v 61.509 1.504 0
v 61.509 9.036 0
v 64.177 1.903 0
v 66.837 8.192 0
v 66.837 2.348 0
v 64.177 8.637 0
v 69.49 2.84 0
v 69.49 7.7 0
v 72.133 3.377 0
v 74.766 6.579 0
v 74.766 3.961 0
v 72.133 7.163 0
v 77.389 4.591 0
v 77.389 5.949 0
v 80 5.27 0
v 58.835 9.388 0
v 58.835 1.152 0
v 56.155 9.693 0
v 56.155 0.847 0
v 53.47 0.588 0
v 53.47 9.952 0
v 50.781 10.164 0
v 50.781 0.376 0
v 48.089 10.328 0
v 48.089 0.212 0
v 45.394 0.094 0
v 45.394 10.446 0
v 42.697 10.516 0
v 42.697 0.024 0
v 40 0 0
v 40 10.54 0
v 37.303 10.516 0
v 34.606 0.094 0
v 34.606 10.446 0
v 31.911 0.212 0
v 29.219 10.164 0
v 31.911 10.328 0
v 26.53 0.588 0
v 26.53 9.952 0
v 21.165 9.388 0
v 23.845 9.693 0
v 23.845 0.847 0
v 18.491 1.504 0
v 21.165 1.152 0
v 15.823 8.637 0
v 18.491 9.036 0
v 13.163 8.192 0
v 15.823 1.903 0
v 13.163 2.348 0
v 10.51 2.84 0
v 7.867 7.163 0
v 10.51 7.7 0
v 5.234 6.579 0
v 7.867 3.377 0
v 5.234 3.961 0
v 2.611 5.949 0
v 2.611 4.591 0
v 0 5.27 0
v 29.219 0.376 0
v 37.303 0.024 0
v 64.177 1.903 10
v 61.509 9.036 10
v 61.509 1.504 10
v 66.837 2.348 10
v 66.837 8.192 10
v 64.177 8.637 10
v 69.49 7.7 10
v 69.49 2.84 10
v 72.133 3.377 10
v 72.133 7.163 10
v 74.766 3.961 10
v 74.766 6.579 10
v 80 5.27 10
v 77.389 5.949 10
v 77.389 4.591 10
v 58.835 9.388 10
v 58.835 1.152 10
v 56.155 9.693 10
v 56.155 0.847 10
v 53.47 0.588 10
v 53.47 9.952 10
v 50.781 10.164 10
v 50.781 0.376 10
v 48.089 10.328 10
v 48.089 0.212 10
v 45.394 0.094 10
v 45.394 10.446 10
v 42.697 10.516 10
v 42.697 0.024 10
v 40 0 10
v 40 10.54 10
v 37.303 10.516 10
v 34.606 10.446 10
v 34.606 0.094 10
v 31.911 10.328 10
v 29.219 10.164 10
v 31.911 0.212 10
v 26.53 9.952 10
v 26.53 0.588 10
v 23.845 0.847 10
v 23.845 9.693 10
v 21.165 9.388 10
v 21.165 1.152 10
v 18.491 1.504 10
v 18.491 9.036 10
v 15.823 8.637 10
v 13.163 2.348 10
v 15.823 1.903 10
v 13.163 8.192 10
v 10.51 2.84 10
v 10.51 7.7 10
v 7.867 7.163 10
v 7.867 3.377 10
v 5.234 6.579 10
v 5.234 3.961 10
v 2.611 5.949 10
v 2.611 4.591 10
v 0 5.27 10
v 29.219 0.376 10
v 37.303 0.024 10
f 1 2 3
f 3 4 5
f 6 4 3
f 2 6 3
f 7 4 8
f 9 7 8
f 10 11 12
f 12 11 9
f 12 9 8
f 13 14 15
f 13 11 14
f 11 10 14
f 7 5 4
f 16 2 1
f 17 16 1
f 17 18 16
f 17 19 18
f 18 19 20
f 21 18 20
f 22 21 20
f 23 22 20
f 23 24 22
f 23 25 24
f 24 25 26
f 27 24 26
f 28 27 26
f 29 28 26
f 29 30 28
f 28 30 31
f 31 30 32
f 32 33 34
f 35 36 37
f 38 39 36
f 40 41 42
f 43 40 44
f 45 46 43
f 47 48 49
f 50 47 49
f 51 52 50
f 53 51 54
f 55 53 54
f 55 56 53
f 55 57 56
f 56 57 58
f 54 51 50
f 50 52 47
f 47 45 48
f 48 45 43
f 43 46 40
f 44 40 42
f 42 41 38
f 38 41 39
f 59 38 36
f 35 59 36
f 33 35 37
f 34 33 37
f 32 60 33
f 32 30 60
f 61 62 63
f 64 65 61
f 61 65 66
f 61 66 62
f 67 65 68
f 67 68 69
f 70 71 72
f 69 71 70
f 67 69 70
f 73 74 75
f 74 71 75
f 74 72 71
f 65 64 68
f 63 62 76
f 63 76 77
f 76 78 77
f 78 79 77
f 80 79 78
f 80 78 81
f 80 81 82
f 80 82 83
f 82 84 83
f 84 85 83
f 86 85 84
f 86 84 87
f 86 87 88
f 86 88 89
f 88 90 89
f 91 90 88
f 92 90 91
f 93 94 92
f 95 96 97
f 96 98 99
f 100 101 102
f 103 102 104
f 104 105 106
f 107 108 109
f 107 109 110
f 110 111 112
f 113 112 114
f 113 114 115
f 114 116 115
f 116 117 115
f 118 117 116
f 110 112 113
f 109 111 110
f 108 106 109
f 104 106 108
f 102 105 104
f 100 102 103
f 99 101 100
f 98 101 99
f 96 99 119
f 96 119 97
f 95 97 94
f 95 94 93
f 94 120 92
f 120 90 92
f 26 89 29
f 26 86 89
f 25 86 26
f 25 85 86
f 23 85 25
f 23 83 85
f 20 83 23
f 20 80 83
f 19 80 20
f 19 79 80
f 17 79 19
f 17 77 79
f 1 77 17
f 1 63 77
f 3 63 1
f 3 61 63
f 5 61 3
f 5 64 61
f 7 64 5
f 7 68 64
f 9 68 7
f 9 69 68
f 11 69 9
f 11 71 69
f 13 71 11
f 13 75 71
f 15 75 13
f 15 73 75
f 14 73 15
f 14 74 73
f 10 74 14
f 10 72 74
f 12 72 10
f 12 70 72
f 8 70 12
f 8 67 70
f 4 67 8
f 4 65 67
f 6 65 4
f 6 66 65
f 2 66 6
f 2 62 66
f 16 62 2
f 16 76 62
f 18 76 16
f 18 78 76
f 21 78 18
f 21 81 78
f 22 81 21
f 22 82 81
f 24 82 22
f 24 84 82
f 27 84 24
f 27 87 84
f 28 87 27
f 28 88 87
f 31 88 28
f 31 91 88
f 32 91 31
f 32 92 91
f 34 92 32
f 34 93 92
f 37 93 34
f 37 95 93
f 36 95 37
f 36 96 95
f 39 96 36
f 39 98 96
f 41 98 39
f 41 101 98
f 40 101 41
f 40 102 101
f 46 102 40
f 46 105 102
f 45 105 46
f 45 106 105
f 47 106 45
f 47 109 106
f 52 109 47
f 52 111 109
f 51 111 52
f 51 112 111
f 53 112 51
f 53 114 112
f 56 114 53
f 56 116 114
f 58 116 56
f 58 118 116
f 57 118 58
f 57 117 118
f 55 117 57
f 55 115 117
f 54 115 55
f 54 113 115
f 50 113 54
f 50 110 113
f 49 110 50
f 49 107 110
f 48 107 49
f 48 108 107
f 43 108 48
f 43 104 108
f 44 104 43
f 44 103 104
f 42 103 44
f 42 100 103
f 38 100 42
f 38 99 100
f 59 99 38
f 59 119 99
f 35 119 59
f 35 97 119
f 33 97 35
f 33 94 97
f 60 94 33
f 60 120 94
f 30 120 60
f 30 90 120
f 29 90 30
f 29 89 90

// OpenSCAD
$fn = 32;

// ----------------------------------------------------------------------
// Arc profile plate: lens, 60 points
// ----------------------------------------------------------------------

// --- parameters (mm) ---
lens_chord = 80;          // chord length of the lens, X
arc_r = 154.55;           // radius of both arcs
arc_angle = 30;           // angle of each arc, degrees
sagitta = 5.27;           // bulge of each arc (half the lens height)
arc_step = 1;             // sampling step of the arcs, degrees
plate_t = 10;             // plate thickness, Z

bbox_y = 2 * sagitta;  // full lens height

profile = [[80, 5.27], [77.389, 5.949], [74.766, 6.579], [72.133, 7.163], [69.49, 7.7], [66.837, 8.192], [64.177, 8.637], [61.509, 9.036], [58.835, 9.388], [56.155, 9.693], [53.47, 9.952], [50.781, 10.164], [48.089, 10.328], [45.394, 10.446], [42.697, 10.516], [40, 10.54], [37.303, 10.516], [34.606, 10.446], [31.911, 10.328], [29.219, 10.164], [26.53, 9.952], [23.845, 9.693], [21.165, 9.388], [18.491, 9.036], [15.823, 8.637], [13.163, 8.192], [10.51, 7.7], [7.867, 7.163], [5.234, 6.579], [2.611, 5.949], [0, 5.27], [2.611, 4.591], [5.234, 3.961], [7.867, 3.377], [10.51, 2.84], [13.163, 2.348], [15.823, 1.903], [18.491, 1.504], [21.165, 1.152], [23.845, 0.847], [26.53, 0.588], [29.219, 0.376], [31.911, 0.212], [34.606, 0.094], [37.303, 0.024], [40, 0], [42.697, 0.024], [45.394, 0.094], [48.089, 0.212], [50.781, 0.376], [53.47, 0.588], [56.155, 0.847], [58.835, 1.152], [61.509, 1.504], [64.177, 1.903], [66.837, 2.348], [69.49, 2.84], [72.133, 3.377], [74.766, 3.961], [77.389, 4.591]];  // primary outline, 60 points, counter clockwise

// --- the one profile operation ---
linear_extrude(height = plate_t) polygon(points = profile);
